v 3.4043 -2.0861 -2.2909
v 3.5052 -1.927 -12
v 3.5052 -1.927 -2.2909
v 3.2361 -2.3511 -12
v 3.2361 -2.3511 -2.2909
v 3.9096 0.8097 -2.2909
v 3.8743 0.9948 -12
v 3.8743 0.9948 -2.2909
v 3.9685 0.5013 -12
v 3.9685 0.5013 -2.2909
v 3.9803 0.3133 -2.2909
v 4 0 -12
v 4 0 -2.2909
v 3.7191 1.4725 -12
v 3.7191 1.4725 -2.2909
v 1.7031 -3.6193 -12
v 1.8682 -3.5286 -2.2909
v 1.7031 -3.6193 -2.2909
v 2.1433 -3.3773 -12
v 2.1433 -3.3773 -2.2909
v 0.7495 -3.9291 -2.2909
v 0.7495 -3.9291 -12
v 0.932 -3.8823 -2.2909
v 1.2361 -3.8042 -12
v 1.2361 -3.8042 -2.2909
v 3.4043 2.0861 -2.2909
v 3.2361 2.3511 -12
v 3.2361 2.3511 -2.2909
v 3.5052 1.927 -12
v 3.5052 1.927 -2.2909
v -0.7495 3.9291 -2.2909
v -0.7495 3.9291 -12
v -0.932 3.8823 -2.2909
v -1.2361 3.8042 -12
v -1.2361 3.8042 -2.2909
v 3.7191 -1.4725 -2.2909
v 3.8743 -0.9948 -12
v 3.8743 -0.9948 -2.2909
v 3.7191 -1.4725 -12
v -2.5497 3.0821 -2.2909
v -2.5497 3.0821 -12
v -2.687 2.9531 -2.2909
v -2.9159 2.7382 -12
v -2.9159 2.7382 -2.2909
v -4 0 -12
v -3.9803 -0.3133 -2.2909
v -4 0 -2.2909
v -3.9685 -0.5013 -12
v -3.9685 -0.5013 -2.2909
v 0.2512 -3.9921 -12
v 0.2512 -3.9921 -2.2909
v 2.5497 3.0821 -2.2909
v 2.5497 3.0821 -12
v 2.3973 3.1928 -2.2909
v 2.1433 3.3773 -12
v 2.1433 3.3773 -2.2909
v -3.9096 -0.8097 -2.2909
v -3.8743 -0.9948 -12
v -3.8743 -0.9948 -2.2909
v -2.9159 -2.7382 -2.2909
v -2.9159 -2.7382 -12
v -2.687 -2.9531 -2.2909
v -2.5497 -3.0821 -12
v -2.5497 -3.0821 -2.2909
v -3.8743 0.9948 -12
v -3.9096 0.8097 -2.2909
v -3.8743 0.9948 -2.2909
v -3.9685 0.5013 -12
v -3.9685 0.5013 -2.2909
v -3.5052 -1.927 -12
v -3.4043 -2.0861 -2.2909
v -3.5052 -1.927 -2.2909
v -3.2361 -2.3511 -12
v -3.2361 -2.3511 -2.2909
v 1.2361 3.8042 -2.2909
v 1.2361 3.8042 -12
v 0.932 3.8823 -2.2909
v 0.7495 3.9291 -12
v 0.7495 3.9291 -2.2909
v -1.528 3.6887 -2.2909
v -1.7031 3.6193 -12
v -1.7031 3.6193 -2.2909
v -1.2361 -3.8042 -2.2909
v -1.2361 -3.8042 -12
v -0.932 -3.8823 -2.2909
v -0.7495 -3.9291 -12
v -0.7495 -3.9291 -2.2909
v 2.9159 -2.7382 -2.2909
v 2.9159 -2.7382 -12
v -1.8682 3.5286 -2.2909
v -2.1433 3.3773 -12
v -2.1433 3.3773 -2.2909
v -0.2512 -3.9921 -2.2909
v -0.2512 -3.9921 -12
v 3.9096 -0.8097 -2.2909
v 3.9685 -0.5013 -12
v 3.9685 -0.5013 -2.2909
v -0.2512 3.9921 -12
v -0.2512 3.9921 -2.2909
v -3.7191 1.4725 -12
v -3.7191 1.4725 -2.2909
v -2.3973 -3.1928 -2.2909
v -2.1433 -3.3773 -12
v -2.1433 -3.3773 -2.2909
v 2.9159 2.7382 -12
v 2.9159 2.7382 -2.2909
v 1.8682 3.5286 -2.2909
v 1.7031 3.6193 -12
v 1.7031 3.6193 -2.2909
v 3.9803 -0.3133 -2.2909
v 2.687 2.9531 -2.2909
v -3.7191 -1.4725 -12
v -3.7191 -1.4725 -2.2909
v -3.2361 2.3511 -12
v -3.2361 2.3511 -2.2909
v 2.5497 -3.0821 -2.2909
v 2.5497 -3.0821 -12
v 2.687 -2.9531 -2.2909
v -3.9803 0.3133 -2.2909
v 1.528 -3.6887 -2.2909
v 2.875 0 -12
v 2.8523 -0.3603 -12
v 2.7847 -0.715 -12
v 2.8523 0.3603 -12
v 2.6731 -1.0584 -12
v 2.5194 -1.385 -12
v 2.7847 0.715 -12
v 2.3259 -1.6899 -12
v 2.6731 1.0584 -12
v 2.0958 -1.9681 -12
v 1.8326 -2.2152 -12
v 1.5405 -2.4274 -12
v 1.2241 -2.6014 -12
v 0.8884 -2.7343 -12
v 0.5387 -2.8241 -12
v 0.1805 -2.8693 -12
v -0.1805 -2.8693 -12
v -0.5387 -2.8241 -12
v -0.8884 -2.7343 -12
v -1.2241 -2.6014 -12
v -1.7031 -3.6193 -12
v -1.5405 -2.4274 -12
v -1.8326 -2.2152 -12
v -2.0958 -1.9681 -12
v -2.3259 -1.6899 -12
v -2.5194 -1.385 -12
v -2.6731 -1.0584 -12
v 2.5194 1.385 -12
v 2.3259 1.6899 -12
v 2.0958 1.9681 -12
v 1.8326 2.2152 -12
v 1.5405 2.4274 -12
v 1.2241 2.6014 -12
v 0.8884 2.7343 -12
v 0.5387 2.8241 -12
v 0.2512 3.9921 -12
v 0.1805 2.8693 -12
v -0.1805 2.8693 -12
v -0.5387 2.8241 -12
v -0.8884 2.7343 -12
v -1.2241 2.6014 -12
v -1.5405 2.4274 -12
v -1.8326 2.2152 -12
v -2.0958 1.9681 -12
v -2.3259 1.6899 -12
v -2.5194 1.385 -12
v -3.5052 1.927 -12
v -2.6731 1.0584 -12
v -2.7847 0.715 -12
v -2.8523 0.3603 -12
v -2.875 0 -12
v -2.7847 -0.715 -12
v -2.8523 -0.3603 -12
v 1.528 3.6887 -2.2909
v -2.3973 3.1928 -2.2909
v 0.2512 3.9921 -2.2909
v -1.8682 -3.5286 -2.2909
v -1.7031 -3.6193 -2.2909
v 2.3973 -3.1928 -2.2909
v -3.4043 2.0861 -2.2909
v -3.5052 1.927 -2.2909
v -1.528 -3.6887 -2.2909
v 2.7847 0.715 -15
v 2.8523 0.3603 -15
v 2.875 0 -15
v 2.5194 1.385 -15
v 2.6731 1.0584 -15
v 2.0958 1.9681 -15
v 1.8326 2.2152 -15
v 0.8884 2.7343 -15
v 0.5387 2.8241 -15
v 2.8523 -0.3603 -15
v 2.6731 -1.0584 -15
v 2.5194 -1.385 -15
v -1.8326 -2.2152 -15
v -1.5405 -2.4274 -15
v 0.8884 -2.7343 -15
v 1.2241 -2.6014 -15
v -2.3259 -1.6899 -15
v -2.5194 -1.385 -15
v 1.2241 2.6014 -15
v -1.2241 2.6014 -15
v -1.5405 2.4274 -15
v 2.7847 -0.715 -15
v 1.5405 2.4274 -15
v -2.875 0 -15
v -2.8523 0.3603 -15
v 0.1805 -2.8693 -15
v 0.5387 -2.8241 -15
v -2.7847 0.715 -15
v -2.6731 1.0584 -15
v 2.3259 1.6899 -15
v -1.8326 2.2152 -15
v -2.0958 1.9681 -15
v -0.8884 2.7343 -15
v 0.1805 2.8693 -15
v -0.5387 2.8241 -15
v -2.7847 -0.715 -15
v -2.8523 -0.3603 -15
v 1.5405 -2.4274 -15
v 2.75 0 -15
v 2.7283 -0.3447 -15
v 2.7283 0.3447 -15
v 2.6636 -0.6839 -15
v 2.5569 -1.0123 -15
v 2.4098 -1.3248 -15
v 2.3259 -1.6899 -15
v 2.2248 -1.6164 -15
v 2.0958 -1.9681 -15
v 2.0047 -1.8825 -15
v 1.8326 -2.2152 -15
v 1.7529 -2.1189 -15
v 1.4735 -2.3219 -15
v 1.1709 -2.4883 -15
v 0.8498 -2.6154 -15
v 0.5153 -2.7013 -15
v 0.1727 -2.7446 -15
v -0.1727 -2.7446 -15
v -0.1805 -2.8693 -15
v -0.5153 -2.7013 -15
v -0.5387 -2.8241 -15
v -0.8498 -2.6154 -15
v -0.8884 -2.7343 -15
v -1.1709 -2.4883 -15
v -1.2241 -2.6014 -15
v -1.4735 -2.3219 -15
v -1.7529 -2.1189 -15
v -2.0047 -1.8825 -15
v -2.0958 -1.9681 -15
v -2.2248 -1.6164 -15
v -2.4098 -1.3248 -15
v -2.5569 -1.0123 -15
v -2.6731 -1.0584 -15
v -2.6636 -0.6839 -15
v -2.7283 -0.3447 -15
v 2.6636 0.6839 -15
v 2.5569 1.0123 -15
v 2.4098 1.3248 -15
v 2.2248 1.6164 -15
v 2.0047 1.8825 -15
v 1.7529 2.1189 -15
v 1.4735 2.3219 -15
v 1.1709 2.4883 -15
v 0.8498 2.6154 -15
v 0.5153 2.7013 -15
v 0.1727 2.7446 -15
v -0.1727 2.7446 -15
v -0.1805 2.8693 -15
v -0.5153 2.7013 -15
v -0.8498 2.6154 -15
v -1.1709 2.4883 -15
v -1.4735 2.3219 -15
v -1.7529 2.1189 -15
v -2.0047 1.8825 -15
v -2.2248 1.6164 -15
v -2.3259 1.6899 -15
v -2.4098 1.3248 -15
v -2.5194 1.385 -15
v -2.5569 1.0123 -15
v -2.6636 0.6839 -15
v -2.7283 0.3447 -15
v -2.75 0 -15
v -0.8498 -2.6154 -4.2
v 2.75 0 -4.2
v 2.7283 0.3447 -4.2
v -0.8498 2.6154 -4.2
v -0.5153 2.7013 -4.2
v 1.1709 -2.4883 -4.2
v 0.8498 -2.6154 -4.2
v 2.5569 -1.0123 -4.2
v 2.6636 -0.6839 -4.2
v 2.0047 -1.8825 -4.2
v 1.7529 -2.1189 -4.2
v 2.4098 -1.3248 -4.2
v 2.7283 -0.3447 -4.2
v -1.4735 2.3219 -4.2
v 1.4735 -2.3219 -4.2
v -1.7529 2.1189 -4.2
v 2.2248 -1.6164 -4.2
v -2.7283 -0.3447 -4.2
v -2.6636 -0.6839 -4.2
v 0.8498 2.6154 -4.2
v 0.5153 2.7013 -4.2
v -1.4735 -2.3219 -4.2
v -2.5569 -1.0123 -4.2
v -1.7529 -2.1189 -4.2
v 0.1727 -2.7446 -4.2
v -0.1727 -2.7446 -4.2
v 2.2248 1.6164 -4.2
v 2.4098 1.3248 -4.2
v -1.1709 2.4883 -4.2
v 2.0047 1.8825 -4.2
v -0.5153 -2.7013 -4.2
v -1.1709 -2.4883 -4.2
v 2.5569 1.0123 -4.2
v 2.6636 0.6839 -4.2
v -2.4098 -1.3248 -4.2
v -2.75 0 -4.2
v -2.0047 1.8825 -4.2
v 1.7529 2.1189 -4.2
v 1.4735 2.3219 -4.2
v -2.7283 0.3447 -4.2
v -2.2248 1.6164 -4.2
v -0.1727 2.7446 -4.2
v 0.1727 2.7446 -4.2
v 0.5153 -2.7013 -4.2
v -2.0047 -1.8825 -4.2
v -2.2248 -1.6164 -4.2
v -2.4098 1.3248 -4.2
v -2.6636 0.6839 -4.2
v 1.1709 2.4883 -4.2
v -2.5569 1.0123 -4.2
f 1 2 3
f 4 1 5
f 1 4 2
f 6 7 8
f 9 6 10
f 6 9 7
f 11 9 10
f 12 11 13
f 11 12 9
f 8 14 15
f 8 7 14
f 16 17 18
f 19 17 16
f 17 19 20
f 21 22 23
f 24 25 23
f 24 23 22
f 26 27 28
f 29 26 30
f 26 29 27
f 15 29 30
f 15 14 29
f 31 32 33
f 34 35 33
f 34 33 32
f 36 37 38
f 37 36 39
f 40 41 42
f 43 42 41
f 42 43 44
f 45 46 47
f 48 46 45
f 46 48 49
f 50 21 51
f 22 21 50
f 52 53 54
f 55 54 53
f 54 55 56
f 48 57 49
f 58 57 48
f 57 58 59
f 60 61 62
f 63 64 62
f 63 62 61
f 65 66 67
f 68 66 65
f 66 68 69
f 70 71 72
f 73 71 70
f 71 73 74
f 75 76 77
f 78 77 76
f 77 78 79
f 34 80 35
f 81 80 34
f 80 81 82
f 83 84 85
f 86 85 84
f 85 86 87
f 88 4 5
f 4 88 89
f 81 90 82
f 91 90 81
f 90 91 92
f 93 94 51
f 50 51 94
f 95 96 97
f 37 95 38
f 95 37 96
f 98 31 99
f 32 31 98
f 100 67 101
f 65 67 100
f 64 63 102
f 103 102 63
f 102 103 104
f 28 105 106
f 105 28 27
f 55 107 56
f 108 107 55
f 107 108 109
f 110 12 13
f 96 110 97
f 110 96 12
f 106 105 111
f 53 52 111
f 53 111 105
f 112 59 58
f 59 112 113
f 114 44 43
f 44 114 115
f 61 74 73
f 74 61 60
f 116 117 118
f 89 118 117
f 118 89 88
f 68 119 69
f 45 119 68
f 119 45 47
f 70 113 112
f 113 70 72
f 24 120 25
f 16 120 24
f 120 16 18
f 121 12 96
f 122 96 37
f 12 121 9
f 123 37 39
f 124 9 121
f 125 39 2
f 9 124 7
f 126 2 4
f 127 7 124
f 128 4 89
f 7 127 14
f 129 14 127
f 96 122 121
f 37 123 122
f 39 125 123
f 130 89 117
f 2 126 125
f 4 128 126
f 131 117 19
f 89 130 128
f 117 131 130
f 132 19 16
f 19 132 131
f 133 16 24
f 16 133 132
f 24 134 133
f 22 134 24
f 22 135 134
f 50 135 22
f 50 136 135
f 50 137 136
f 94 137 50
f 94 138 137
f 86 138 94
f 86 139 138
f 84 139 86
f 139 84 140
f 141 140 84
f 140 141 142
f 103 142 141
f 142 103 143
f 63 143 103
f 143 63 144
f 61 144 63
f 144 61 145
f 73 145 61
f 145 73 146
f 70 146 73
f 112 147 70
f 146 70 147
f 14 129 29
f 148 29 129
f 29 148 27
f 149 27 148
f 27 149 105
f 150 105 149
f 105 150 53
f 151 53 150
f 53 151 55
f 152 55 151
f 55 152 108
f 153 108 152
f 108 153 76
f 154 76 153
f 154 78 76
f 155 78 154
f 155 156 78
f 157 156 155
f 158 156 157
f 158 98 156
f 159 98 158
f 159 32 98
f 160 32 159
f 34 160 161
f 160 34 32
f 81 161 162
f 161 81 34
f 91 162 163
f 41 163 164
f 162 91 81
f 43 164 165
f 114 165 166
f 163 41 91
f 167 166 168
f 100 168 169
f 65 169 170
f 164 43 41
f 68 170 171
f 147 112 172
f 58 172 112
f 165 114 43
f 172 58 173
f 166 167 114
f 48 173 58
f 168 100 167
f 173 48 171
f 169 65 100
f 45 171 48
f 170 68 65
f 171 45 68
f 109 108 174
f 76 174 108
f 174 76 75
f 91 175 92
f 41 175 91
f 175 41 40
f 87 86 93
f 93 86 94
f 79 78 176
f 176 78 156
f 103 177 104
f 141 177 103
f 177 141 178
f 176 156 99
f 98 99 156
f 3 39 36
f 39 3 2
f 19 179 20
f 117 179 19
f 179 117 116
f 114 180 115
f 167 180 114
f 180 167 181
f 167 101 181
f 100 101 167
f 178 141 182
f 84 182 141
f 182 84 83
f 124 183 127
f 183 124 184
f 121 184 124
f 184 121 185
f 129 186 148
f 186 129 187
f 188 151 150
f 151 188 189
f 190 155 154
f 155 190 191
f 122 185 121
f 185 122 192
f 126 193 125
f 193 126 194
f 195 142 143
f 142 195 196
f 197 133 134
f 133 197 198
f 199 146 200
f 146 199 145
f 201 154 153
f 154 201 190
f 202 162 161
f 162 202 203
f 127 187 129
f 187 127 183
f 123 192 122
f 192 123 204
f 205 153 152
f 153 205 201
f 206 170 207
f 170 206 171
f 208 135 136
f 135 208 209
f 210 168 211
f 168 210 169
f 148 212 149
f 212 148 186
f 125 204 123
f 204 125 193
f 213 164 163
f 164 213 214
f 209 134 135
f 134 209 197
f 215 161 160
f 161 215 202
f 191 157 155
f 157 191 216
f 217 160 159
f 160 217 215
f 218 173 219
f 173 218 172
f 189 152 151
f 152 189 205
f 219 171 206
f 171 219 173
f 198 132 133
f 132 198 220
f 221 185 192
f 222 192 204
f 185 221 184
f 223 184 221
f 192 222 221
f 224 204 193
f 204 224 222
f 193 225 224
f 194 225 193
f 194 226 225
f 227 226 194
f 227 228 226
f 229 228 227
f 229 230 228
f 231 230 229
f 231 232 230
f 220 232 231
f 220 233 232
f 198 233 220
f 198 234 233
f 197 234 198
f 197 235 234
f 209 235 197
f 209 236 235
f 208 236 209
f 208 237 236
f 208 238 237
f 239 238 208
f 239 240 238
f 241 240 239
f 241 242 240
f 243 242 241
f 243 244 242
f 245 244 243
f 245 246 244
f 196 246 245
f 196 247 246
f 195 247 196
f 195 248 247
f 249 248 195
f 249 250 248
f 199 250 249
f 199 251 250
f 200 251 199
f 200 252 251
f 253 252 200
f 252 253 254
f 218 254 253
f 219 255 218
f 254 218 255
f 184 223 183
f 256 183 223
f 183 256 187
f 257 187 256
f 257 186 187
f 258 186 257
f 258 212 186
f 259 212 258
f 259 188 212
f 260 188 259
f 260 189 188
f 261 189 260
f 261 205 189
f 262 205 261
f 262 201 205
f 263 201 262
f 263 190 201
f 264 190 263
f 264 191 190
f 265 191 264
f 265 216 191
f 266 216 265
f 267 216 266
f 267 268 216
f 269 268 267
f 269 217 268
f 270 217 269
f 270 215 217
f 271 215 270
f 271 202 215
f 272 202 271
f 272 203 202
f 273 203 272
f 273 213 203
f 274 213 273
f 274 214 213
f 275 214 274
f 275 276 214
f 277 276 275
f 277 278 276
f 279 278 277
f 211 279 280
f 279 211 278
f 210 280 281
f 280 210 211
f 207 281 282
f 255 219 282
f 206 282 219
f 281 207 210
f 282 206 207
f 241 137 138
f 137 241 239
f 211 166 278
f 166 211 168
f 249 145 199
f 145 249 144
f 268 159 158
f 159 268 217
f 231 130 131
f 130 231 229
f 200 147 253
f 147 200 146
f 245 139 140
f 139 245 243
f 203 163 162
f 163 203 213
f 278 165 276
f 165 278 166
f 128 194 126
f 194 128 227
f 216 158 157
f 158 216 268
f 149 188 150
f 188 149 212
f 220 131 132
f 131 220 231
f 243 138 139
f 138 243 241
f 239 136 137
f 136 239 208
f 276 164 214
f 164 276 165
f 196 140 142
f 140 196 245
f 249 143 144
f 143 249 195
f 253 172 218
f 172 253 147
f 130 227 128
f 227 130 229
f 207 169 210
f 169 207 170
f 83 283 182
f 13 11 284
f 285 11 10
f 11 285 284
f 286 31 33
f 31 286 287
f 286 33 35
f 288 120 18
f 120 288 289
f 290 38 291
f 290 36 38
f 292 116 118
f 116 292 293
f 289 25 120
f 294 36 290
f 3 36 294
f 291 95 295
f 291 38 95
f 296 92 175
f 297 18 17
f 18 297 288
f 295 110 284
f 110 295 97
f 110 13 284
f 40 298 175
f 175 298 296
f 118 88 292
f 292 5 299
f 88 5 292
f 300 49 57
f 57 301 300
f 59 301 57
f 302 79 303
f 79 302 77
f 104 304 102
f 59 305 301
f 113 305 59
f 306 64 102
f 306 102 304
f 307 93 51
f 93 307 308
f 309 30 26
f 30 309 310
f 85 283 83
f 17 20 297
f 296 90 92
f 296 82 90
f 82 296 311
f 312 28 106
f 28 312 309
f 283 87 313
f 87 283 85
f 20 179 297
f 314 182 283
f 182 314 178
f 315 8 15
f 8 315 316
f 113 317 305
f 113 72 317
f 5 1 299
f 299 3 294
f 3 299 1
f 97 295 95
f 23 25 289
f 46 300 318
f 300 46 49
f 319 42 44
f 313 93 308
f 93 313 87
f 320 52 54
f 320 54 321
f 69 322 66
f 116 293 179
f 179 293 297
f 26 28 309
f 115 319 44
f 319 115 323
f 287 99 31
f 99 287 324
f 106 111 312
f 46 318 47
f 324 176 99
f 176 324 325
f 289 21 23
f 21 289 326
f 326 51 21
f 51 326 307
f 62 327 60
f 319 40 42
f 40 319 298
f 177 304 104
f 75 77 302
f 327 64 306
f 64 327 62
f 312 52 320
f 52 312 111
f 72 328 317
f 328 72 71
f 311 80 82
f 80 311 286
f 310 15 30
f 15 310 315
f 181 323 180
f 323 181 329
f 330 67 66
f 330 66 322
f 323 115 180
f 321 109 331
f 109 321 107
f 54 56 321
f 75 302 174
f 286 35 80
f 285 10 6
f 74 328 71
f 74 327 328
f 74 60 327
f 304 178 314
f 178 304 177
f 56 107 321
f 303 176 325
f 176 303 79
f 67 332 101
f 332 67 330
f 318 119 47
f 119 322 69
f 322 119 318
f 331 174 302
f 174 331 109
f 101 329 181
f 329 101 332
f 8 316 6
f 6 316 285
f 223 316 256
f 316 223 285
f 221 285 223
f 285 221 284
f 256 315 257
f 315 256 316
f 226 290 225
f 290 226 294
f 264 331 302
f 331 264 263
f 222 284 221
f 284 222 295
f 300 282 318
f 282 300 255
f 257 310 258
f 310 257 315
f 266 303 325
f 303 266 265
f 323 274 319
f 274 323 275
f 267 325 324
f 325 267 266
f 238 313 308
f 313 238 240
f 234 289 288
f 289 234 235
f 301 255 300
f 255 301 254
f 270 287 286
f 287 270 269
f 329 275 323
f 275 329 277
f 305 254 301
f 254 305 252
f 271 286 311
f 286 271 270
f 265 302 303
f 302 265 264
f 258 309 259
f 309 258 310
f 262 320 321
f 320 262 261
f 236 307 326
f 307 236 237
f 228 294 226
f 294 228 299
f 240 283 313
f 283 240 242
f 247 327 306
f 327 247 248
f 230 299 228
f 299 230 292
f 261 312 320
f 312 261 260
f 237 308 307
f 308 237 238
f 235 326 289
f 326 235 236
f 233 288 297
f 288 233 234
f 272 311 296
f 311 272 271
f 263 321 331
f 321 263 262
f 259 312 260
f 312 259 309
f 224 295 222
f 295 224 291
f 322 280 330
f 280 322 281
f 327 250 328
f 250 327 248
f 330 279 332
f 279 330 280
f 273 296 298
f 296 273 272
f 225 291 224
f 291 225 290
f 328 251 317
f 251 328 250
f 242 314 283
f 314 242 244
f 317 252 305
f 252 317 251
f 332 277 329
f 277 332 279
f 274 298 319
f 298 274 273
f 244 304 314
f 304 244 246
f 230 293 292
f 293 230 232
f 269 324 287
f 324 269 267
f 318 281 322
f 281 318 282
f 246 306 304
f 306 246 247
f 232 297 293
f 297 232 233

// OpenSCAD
$fn = 50;

difference() {
	union() {
		translate(v = [0, 0, -12.0]) {
			cylinder(h = 15, r = 4.0);
		}
		#translate(v = [0, 0, -15.0]) {
			cylinder(h = 15, r = 2.875);
		}
	}
	union() {
		translate(v = [0, 0, 0]) {
			rotate(a = [0, 0, 0]) {
				difference() {
					union() {
						translate(v = [0, 0, -15.0]) {
							cylinder(h = 15, r = 2.25);
						}
						translate(v = [0, 0, -4.2]) {
							cylinder(h = 4.2, r1 = 2.75, r2 = 5.5);
						}
						translate(v = [0, 0, -15.0]) {
							cylinder(h = 15, r = 2.75);
						}
						translate(v = [0, 0, -15.0]) {
							cylinder(h = 15, r = 2.25);
						}
					}
					union();
				}
			}
		}
		#cylinder(h = 3, r = 6.25);
	}
}
